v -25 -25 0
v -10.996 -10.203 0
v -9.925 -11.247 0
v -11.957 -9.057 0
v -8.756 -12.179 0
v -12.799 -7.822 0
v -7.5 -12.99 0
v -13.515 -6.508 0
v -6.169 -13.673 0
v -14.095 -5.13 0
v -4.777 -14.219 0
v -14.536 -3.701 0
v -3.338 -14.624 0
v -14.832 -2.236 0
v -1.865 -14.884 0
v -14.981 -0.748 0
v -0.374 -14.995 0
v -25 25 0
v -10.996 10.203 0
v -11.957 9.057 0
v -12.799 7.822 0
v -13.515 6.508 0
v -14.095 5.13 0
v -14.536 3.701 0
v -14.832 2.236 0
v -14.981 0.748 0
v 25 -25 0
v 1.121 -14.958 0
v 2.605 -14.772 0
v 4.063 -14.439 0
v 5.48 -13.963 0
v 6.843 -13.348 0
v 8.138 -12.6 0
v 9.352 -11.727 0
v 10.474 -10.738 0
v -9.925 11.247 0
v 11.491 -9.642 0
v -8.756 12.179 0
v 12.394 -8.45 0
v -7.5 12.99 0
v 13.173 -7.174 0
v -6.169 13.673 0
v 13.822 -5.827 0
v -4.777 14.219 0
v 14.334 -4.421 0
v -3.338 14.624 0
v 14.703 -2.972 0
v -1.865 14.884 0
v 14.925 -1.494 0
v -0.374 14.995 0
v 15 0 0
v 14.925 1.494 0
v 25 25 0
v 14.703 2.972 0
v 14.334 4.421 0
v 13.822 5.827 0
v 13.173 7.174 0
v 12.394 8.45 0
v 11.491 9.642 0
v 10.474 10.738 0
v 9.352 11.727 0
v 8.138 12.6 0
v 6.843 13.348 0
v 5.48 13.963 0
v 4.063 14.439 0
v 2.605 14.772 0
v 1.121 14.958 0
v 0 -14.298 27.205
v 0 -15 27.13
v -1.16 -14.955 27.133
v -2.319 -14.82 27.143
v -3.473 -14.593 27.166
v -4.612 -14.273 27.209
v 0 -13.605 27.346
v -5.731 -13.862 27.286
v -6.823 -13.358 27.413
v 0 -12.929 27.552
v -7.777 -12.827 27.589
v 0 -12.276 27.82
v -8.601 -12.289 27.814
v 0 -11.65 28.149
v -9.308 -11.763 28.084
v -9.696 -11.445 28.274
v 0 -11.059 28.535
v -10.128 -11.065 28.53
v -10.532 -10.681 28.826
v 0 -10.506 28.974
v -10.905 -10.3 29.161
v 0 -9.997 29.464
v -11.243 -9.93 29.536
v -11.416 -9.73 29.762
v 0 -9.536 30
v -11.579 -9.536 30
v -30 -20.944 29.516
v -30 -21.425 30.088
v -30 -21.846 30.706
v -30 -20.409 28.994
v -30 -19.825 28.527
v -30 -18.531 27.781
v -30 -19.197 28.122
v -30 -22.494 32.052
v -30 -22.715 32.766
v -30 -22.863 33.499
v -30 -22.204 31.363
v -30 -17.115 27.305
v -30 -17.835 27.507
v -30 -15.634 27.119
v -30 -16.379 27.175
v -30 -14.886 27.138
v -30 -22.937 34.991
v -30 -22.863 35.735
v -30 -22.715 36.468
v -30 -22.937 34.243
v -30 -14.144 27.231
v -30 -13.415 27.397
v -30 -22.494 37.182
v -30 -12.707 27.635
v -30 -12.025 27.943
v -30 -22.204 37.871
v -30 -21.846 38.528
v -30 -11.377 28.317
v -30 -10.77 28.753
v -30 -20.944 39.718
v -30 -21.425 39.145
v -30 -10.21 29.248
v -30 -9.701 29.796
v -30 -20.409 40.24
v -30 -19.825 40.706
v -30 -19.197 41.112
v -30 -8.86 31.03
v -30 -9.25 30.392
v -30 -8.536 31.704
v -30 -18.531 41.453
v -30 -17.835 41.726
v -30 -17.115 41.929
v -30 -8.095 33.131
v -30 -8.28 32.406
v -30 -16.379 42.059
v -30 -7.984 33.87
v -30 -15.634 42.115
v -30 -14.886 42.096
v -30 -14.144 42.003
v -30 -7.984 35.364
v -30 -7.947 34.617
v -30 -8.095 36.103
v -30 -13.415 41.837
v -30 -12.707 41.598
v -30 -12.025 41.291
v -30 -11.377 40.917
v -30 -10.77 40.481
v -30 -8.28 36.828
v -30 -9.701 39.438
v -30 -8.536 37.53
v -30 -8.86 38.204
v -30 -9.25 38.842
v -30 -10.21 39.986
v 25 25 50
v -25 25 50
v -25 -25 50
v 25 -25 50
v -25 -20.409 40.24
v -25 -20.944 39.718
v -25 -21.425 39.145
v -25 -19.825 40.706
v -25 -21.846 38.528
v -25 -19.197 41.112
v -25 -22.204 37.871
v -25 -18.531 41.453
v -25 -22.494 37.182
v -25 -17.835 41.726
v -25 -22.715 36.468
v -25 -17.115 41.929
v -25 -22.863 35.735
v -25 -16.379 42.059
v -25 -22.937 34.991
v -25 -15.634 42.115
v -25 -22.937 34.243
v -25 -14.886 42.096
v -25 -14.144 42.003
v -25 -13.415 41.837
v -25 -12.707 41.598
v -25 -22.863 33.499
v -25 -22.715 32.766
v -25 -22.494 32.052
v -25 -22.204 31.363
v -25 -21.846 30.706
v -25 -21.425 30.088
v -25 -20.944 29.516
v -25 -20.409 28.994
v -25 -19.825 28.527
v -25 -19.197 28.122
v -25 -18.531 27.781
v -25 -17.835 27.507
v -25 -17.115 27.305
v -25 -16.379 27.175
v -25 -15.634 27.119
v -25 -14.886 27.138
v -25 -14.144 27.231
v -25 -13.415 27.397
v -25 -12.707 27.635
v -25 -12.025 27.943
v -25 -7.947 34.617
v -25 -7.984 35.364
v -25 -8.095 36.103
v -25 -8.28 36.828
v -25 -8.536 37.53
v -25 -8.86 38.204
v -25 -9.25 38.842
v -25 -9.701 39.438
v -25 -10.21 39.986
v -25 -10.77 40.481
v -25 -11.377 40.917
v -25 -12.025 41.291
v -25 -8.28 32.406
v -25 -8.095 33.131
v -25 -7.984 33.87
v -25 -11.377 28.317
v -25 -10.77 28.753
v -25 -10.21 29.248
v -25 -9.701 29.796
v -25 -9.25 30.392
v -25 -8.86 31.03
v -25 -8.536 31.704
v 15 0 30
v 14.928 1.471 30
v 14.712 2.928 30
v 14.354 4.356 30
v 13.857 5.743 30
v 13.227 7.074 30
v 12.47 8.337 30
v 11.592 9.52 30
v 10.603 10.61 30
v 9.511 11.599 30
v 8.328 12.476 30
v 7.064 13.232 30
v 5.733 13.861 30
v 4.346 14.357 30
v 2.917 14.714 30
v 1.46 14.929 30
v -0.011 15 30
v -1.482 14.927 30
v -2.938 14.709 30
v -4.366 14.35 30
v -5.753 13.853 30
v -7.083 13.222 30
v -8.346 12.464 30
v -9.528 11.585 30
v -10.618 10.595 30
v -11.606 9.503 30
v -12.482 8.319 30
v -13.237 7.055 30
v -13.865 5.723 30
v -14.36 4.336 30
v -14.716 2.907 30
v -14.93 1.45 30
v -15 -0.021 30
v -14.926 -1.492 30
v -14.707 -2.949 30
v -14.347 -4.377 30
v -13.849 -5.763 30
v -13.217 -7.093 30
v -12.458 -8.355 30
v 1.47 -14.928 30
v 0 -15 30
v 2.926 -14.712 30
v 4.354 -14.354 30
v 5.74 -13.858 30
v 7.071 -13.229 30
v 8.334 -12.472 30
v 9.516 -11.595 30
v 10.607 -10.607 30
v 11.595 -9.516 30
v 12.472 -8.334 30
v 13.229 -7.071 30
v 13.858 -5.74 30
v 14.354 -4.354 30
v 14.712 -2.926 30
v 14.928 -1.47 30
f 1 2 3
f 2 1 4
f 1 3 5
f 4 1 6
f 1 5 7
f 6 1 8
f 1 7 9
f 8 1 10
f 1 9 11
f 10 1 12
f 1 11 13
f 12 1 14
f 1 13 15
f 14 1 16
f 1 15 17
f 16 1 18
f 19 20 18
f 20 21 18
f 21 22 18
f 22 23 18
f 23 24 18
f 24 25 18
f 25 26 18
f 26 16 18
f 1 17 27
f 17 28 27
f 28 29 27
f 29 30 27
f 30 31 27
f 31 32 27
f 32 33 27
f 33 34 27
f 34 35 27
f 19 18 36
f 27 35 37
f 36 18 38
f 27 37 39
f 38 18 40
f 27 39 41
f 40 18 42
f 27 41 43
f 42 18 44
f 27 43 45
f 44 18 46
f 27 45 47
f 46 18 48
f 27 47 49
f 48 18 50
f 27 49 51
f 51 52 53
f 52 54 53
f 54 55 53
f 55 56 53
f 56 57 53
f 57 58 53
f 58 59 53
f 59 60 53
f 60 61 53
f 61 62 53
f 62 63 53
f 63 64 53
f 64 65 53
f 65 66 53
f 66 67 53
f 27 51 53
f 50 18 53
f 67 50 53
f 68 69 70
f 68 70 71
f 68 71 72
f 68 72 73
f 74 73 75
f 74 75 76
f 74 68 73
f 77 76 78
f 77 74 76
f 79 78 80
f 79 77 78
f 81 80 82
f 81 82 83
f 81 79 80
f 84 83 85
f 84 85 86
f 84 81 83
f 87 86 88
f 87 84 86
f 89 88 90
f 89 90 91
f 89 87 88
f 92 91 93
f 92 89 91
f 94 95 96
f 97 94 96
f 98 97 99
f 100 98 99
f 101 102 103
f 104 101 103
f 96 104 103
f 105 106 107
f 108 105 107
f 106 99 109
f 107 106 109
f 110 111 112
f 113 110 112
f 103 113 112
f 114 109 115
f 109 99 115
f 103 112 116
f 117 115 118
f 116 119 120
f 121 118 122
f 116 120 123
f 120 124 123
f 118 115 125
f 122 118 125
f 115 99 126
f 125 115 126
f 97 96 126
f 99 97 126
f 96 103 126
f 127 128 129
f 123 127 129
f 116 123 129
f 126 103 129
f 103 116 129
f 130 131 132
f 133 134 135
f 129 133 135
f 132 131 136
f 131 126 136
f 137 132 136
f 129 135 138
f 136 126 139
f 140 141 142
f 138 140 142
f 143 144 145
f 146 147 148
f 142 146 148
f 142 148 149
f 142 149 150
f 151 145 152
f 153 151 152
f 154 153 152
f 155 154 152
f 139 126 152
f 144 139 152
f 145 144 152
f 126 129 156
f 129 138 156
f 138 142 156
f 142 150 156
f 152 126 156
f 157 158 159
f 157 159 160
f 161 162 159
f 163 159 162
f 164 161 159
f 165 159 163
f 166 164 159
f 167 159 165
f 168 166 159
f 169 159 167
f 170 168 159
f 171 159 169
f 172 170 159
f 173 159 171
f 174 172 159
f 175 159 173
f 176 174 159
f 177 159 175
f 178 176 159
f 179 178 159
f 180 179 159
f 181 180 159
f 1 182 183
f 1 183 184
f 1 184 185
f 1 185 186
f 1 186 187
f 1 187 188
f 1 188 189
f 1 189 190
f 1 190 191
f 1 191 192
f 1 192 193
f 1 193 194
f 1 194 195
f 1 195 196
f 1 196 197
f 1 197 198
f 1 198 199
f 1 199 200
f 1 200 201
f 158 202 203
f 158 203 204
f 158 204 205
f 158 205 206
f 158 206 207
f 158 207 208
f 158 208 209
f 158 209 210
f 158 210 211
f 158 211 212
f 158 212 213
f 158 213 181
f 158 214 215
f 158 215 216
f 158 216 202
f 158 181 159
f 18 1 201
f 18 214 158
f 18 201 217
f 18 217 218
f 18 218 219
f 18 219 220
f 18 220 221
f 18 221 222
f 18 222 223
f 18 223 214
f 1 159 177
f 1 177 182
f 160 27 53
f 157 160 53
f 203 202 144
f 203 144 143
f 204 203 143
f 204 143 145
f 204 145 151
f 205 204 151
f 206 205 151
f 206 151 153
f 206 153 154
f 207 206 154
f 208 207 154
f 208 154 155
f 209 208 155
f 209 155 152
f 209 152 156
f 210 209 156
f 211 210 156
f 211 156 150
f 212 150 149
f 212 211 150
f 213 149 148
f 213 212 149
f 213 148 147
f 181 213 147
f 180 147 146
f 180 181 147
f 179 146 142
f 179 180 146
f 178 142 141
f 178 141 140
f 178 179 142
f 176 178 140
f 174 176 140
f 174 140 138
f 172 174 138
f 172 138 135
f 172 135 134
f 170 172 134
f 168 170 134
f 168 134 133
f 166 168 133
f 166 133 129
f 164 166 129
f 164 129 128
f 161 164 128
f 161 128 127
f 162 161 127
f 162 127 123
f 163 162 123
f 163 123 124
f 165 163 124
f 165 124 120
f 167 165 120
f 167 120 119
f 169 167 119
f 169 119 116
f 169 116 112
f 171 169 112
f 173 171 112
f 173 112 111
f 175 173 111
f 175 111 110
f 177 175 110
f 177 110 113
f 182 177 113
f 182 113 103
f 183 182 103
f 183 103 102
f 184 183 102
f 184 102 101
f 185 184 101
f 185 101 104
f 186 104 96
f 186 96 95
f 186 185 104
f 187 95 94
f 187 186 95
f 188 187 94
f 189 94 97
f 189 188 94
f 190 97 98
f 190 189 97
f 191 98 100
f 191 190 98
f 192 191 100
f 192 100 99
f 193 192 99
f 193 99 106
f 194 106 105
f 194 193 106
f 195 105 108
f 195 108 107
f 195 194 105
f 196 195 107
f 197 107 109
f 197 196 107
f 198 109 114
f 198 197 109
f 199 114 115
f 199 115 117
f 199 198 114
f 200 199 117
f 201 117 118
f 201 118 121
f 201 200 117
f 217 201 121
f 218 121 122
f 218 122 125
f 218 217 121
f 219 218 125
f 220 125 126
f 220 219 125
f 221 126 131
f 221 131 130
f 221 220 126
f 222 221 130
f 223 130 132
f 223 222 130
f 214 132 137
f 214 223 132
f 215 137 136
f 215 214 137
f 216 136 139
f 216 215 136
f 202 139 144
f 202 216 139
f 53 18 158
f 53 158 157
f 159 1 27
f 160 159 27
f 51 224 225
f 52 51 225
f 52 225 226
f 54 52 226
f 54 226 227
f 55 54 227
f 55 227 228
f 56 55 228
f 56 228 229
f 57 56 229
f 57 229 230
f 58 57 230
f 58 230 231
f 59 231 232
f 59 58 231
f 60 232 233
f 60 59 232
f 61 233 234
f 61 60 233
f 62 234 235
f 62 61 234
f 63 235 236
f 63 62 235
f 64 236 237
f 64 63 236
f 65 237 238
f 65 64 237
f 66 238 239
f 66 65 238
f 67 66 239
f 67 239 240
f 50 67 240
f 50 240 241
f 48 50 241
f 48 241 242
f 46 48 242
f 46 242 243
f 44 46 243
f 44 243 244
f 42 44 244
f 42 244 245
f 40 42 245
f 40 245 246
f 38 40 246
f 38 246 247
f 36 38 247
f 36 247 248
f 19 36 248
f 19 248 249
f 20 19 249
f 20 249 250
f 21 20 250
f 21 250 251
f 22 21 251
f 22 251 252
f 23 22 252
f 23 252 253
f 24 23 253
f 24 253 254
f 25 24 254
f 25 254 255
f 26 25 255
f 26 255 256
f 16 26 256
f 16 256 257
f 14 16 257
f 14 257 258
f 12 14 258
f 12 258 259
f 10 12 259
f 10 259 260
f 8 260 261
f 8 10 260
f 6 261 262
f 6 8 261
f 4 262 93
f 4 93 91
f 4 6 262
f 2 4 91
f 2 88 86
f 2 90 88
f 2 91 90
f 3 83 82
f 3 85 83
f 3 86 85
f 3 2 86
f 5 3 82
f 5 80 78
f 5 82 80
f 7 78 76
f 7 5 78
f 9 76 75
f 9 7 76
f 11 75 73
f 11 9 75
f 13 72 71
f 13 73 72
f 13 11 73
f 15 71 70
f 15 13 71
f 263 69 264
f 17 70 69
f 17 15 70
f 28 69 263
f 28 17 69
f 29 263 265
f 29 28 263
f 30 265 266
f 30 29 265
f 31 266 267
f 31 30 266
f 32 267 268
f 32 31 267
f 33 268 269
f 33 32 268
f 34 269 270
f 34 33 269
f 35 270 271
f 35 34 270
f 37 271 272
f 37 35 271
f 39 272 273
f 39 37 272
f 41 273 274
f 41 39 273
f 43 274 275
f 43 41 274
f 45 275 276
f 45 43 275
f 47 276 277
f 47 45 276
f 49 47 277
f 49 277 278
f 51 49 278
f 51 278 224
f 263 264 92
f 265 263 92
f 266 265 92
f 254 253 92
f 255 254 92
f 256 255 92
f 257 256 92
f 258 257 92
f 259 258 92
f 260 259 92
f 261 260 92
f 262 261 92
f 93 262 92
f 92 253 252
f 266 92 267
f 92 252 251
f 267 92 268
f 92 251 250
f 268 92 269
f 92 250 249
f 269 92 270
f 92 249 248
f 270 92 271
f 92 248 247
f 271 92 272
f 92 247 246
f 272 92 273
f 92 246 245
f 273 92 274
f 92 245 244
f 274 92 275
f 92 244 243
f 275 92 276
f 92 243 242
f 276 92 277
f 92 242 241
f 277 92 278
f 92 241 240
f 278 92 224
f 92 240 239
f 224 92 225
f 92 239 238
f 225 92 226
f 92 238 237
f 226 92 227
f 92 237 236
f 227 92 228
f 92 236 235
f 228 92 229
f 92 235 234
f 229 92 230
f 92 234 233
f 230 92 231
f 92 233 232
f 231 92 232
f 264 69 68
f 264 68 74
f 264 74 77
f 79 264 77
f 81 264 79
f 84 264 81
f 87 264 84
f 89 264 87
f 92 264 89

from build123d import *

# Parameters (mm, degrees)
F0_W     = 50
F0_H     = 50
F1_DEPTH = 50
F2_R     = 15
F3_DEPTH = 30
F4_R     = 7.5
F5_DEPTH = 30


with BuildPart() as f1:
    # F0 (on Top) → F1 (new body)
    with BuildSketch(Plane.XY):
        Rectangle(F0_W, F0_H)
    extrude(amount=F1_DEPTH)

    # F2 (on Top) → F3 (cut)
    with BuildSketch(Plane.XY):
        Circle(F2_R)
    extrude(amount=F3_DEPTH, mode=Mode.SUBTRACT)

    # F4 (on Right) → F5 (join)
    with BuildSketch(Plane.YZ):
        with Locations((-15.446586, 34.616902)):
            Circle(F4_R)
    extrude(amount=-F5_DEPTH)


solid = f1.part
